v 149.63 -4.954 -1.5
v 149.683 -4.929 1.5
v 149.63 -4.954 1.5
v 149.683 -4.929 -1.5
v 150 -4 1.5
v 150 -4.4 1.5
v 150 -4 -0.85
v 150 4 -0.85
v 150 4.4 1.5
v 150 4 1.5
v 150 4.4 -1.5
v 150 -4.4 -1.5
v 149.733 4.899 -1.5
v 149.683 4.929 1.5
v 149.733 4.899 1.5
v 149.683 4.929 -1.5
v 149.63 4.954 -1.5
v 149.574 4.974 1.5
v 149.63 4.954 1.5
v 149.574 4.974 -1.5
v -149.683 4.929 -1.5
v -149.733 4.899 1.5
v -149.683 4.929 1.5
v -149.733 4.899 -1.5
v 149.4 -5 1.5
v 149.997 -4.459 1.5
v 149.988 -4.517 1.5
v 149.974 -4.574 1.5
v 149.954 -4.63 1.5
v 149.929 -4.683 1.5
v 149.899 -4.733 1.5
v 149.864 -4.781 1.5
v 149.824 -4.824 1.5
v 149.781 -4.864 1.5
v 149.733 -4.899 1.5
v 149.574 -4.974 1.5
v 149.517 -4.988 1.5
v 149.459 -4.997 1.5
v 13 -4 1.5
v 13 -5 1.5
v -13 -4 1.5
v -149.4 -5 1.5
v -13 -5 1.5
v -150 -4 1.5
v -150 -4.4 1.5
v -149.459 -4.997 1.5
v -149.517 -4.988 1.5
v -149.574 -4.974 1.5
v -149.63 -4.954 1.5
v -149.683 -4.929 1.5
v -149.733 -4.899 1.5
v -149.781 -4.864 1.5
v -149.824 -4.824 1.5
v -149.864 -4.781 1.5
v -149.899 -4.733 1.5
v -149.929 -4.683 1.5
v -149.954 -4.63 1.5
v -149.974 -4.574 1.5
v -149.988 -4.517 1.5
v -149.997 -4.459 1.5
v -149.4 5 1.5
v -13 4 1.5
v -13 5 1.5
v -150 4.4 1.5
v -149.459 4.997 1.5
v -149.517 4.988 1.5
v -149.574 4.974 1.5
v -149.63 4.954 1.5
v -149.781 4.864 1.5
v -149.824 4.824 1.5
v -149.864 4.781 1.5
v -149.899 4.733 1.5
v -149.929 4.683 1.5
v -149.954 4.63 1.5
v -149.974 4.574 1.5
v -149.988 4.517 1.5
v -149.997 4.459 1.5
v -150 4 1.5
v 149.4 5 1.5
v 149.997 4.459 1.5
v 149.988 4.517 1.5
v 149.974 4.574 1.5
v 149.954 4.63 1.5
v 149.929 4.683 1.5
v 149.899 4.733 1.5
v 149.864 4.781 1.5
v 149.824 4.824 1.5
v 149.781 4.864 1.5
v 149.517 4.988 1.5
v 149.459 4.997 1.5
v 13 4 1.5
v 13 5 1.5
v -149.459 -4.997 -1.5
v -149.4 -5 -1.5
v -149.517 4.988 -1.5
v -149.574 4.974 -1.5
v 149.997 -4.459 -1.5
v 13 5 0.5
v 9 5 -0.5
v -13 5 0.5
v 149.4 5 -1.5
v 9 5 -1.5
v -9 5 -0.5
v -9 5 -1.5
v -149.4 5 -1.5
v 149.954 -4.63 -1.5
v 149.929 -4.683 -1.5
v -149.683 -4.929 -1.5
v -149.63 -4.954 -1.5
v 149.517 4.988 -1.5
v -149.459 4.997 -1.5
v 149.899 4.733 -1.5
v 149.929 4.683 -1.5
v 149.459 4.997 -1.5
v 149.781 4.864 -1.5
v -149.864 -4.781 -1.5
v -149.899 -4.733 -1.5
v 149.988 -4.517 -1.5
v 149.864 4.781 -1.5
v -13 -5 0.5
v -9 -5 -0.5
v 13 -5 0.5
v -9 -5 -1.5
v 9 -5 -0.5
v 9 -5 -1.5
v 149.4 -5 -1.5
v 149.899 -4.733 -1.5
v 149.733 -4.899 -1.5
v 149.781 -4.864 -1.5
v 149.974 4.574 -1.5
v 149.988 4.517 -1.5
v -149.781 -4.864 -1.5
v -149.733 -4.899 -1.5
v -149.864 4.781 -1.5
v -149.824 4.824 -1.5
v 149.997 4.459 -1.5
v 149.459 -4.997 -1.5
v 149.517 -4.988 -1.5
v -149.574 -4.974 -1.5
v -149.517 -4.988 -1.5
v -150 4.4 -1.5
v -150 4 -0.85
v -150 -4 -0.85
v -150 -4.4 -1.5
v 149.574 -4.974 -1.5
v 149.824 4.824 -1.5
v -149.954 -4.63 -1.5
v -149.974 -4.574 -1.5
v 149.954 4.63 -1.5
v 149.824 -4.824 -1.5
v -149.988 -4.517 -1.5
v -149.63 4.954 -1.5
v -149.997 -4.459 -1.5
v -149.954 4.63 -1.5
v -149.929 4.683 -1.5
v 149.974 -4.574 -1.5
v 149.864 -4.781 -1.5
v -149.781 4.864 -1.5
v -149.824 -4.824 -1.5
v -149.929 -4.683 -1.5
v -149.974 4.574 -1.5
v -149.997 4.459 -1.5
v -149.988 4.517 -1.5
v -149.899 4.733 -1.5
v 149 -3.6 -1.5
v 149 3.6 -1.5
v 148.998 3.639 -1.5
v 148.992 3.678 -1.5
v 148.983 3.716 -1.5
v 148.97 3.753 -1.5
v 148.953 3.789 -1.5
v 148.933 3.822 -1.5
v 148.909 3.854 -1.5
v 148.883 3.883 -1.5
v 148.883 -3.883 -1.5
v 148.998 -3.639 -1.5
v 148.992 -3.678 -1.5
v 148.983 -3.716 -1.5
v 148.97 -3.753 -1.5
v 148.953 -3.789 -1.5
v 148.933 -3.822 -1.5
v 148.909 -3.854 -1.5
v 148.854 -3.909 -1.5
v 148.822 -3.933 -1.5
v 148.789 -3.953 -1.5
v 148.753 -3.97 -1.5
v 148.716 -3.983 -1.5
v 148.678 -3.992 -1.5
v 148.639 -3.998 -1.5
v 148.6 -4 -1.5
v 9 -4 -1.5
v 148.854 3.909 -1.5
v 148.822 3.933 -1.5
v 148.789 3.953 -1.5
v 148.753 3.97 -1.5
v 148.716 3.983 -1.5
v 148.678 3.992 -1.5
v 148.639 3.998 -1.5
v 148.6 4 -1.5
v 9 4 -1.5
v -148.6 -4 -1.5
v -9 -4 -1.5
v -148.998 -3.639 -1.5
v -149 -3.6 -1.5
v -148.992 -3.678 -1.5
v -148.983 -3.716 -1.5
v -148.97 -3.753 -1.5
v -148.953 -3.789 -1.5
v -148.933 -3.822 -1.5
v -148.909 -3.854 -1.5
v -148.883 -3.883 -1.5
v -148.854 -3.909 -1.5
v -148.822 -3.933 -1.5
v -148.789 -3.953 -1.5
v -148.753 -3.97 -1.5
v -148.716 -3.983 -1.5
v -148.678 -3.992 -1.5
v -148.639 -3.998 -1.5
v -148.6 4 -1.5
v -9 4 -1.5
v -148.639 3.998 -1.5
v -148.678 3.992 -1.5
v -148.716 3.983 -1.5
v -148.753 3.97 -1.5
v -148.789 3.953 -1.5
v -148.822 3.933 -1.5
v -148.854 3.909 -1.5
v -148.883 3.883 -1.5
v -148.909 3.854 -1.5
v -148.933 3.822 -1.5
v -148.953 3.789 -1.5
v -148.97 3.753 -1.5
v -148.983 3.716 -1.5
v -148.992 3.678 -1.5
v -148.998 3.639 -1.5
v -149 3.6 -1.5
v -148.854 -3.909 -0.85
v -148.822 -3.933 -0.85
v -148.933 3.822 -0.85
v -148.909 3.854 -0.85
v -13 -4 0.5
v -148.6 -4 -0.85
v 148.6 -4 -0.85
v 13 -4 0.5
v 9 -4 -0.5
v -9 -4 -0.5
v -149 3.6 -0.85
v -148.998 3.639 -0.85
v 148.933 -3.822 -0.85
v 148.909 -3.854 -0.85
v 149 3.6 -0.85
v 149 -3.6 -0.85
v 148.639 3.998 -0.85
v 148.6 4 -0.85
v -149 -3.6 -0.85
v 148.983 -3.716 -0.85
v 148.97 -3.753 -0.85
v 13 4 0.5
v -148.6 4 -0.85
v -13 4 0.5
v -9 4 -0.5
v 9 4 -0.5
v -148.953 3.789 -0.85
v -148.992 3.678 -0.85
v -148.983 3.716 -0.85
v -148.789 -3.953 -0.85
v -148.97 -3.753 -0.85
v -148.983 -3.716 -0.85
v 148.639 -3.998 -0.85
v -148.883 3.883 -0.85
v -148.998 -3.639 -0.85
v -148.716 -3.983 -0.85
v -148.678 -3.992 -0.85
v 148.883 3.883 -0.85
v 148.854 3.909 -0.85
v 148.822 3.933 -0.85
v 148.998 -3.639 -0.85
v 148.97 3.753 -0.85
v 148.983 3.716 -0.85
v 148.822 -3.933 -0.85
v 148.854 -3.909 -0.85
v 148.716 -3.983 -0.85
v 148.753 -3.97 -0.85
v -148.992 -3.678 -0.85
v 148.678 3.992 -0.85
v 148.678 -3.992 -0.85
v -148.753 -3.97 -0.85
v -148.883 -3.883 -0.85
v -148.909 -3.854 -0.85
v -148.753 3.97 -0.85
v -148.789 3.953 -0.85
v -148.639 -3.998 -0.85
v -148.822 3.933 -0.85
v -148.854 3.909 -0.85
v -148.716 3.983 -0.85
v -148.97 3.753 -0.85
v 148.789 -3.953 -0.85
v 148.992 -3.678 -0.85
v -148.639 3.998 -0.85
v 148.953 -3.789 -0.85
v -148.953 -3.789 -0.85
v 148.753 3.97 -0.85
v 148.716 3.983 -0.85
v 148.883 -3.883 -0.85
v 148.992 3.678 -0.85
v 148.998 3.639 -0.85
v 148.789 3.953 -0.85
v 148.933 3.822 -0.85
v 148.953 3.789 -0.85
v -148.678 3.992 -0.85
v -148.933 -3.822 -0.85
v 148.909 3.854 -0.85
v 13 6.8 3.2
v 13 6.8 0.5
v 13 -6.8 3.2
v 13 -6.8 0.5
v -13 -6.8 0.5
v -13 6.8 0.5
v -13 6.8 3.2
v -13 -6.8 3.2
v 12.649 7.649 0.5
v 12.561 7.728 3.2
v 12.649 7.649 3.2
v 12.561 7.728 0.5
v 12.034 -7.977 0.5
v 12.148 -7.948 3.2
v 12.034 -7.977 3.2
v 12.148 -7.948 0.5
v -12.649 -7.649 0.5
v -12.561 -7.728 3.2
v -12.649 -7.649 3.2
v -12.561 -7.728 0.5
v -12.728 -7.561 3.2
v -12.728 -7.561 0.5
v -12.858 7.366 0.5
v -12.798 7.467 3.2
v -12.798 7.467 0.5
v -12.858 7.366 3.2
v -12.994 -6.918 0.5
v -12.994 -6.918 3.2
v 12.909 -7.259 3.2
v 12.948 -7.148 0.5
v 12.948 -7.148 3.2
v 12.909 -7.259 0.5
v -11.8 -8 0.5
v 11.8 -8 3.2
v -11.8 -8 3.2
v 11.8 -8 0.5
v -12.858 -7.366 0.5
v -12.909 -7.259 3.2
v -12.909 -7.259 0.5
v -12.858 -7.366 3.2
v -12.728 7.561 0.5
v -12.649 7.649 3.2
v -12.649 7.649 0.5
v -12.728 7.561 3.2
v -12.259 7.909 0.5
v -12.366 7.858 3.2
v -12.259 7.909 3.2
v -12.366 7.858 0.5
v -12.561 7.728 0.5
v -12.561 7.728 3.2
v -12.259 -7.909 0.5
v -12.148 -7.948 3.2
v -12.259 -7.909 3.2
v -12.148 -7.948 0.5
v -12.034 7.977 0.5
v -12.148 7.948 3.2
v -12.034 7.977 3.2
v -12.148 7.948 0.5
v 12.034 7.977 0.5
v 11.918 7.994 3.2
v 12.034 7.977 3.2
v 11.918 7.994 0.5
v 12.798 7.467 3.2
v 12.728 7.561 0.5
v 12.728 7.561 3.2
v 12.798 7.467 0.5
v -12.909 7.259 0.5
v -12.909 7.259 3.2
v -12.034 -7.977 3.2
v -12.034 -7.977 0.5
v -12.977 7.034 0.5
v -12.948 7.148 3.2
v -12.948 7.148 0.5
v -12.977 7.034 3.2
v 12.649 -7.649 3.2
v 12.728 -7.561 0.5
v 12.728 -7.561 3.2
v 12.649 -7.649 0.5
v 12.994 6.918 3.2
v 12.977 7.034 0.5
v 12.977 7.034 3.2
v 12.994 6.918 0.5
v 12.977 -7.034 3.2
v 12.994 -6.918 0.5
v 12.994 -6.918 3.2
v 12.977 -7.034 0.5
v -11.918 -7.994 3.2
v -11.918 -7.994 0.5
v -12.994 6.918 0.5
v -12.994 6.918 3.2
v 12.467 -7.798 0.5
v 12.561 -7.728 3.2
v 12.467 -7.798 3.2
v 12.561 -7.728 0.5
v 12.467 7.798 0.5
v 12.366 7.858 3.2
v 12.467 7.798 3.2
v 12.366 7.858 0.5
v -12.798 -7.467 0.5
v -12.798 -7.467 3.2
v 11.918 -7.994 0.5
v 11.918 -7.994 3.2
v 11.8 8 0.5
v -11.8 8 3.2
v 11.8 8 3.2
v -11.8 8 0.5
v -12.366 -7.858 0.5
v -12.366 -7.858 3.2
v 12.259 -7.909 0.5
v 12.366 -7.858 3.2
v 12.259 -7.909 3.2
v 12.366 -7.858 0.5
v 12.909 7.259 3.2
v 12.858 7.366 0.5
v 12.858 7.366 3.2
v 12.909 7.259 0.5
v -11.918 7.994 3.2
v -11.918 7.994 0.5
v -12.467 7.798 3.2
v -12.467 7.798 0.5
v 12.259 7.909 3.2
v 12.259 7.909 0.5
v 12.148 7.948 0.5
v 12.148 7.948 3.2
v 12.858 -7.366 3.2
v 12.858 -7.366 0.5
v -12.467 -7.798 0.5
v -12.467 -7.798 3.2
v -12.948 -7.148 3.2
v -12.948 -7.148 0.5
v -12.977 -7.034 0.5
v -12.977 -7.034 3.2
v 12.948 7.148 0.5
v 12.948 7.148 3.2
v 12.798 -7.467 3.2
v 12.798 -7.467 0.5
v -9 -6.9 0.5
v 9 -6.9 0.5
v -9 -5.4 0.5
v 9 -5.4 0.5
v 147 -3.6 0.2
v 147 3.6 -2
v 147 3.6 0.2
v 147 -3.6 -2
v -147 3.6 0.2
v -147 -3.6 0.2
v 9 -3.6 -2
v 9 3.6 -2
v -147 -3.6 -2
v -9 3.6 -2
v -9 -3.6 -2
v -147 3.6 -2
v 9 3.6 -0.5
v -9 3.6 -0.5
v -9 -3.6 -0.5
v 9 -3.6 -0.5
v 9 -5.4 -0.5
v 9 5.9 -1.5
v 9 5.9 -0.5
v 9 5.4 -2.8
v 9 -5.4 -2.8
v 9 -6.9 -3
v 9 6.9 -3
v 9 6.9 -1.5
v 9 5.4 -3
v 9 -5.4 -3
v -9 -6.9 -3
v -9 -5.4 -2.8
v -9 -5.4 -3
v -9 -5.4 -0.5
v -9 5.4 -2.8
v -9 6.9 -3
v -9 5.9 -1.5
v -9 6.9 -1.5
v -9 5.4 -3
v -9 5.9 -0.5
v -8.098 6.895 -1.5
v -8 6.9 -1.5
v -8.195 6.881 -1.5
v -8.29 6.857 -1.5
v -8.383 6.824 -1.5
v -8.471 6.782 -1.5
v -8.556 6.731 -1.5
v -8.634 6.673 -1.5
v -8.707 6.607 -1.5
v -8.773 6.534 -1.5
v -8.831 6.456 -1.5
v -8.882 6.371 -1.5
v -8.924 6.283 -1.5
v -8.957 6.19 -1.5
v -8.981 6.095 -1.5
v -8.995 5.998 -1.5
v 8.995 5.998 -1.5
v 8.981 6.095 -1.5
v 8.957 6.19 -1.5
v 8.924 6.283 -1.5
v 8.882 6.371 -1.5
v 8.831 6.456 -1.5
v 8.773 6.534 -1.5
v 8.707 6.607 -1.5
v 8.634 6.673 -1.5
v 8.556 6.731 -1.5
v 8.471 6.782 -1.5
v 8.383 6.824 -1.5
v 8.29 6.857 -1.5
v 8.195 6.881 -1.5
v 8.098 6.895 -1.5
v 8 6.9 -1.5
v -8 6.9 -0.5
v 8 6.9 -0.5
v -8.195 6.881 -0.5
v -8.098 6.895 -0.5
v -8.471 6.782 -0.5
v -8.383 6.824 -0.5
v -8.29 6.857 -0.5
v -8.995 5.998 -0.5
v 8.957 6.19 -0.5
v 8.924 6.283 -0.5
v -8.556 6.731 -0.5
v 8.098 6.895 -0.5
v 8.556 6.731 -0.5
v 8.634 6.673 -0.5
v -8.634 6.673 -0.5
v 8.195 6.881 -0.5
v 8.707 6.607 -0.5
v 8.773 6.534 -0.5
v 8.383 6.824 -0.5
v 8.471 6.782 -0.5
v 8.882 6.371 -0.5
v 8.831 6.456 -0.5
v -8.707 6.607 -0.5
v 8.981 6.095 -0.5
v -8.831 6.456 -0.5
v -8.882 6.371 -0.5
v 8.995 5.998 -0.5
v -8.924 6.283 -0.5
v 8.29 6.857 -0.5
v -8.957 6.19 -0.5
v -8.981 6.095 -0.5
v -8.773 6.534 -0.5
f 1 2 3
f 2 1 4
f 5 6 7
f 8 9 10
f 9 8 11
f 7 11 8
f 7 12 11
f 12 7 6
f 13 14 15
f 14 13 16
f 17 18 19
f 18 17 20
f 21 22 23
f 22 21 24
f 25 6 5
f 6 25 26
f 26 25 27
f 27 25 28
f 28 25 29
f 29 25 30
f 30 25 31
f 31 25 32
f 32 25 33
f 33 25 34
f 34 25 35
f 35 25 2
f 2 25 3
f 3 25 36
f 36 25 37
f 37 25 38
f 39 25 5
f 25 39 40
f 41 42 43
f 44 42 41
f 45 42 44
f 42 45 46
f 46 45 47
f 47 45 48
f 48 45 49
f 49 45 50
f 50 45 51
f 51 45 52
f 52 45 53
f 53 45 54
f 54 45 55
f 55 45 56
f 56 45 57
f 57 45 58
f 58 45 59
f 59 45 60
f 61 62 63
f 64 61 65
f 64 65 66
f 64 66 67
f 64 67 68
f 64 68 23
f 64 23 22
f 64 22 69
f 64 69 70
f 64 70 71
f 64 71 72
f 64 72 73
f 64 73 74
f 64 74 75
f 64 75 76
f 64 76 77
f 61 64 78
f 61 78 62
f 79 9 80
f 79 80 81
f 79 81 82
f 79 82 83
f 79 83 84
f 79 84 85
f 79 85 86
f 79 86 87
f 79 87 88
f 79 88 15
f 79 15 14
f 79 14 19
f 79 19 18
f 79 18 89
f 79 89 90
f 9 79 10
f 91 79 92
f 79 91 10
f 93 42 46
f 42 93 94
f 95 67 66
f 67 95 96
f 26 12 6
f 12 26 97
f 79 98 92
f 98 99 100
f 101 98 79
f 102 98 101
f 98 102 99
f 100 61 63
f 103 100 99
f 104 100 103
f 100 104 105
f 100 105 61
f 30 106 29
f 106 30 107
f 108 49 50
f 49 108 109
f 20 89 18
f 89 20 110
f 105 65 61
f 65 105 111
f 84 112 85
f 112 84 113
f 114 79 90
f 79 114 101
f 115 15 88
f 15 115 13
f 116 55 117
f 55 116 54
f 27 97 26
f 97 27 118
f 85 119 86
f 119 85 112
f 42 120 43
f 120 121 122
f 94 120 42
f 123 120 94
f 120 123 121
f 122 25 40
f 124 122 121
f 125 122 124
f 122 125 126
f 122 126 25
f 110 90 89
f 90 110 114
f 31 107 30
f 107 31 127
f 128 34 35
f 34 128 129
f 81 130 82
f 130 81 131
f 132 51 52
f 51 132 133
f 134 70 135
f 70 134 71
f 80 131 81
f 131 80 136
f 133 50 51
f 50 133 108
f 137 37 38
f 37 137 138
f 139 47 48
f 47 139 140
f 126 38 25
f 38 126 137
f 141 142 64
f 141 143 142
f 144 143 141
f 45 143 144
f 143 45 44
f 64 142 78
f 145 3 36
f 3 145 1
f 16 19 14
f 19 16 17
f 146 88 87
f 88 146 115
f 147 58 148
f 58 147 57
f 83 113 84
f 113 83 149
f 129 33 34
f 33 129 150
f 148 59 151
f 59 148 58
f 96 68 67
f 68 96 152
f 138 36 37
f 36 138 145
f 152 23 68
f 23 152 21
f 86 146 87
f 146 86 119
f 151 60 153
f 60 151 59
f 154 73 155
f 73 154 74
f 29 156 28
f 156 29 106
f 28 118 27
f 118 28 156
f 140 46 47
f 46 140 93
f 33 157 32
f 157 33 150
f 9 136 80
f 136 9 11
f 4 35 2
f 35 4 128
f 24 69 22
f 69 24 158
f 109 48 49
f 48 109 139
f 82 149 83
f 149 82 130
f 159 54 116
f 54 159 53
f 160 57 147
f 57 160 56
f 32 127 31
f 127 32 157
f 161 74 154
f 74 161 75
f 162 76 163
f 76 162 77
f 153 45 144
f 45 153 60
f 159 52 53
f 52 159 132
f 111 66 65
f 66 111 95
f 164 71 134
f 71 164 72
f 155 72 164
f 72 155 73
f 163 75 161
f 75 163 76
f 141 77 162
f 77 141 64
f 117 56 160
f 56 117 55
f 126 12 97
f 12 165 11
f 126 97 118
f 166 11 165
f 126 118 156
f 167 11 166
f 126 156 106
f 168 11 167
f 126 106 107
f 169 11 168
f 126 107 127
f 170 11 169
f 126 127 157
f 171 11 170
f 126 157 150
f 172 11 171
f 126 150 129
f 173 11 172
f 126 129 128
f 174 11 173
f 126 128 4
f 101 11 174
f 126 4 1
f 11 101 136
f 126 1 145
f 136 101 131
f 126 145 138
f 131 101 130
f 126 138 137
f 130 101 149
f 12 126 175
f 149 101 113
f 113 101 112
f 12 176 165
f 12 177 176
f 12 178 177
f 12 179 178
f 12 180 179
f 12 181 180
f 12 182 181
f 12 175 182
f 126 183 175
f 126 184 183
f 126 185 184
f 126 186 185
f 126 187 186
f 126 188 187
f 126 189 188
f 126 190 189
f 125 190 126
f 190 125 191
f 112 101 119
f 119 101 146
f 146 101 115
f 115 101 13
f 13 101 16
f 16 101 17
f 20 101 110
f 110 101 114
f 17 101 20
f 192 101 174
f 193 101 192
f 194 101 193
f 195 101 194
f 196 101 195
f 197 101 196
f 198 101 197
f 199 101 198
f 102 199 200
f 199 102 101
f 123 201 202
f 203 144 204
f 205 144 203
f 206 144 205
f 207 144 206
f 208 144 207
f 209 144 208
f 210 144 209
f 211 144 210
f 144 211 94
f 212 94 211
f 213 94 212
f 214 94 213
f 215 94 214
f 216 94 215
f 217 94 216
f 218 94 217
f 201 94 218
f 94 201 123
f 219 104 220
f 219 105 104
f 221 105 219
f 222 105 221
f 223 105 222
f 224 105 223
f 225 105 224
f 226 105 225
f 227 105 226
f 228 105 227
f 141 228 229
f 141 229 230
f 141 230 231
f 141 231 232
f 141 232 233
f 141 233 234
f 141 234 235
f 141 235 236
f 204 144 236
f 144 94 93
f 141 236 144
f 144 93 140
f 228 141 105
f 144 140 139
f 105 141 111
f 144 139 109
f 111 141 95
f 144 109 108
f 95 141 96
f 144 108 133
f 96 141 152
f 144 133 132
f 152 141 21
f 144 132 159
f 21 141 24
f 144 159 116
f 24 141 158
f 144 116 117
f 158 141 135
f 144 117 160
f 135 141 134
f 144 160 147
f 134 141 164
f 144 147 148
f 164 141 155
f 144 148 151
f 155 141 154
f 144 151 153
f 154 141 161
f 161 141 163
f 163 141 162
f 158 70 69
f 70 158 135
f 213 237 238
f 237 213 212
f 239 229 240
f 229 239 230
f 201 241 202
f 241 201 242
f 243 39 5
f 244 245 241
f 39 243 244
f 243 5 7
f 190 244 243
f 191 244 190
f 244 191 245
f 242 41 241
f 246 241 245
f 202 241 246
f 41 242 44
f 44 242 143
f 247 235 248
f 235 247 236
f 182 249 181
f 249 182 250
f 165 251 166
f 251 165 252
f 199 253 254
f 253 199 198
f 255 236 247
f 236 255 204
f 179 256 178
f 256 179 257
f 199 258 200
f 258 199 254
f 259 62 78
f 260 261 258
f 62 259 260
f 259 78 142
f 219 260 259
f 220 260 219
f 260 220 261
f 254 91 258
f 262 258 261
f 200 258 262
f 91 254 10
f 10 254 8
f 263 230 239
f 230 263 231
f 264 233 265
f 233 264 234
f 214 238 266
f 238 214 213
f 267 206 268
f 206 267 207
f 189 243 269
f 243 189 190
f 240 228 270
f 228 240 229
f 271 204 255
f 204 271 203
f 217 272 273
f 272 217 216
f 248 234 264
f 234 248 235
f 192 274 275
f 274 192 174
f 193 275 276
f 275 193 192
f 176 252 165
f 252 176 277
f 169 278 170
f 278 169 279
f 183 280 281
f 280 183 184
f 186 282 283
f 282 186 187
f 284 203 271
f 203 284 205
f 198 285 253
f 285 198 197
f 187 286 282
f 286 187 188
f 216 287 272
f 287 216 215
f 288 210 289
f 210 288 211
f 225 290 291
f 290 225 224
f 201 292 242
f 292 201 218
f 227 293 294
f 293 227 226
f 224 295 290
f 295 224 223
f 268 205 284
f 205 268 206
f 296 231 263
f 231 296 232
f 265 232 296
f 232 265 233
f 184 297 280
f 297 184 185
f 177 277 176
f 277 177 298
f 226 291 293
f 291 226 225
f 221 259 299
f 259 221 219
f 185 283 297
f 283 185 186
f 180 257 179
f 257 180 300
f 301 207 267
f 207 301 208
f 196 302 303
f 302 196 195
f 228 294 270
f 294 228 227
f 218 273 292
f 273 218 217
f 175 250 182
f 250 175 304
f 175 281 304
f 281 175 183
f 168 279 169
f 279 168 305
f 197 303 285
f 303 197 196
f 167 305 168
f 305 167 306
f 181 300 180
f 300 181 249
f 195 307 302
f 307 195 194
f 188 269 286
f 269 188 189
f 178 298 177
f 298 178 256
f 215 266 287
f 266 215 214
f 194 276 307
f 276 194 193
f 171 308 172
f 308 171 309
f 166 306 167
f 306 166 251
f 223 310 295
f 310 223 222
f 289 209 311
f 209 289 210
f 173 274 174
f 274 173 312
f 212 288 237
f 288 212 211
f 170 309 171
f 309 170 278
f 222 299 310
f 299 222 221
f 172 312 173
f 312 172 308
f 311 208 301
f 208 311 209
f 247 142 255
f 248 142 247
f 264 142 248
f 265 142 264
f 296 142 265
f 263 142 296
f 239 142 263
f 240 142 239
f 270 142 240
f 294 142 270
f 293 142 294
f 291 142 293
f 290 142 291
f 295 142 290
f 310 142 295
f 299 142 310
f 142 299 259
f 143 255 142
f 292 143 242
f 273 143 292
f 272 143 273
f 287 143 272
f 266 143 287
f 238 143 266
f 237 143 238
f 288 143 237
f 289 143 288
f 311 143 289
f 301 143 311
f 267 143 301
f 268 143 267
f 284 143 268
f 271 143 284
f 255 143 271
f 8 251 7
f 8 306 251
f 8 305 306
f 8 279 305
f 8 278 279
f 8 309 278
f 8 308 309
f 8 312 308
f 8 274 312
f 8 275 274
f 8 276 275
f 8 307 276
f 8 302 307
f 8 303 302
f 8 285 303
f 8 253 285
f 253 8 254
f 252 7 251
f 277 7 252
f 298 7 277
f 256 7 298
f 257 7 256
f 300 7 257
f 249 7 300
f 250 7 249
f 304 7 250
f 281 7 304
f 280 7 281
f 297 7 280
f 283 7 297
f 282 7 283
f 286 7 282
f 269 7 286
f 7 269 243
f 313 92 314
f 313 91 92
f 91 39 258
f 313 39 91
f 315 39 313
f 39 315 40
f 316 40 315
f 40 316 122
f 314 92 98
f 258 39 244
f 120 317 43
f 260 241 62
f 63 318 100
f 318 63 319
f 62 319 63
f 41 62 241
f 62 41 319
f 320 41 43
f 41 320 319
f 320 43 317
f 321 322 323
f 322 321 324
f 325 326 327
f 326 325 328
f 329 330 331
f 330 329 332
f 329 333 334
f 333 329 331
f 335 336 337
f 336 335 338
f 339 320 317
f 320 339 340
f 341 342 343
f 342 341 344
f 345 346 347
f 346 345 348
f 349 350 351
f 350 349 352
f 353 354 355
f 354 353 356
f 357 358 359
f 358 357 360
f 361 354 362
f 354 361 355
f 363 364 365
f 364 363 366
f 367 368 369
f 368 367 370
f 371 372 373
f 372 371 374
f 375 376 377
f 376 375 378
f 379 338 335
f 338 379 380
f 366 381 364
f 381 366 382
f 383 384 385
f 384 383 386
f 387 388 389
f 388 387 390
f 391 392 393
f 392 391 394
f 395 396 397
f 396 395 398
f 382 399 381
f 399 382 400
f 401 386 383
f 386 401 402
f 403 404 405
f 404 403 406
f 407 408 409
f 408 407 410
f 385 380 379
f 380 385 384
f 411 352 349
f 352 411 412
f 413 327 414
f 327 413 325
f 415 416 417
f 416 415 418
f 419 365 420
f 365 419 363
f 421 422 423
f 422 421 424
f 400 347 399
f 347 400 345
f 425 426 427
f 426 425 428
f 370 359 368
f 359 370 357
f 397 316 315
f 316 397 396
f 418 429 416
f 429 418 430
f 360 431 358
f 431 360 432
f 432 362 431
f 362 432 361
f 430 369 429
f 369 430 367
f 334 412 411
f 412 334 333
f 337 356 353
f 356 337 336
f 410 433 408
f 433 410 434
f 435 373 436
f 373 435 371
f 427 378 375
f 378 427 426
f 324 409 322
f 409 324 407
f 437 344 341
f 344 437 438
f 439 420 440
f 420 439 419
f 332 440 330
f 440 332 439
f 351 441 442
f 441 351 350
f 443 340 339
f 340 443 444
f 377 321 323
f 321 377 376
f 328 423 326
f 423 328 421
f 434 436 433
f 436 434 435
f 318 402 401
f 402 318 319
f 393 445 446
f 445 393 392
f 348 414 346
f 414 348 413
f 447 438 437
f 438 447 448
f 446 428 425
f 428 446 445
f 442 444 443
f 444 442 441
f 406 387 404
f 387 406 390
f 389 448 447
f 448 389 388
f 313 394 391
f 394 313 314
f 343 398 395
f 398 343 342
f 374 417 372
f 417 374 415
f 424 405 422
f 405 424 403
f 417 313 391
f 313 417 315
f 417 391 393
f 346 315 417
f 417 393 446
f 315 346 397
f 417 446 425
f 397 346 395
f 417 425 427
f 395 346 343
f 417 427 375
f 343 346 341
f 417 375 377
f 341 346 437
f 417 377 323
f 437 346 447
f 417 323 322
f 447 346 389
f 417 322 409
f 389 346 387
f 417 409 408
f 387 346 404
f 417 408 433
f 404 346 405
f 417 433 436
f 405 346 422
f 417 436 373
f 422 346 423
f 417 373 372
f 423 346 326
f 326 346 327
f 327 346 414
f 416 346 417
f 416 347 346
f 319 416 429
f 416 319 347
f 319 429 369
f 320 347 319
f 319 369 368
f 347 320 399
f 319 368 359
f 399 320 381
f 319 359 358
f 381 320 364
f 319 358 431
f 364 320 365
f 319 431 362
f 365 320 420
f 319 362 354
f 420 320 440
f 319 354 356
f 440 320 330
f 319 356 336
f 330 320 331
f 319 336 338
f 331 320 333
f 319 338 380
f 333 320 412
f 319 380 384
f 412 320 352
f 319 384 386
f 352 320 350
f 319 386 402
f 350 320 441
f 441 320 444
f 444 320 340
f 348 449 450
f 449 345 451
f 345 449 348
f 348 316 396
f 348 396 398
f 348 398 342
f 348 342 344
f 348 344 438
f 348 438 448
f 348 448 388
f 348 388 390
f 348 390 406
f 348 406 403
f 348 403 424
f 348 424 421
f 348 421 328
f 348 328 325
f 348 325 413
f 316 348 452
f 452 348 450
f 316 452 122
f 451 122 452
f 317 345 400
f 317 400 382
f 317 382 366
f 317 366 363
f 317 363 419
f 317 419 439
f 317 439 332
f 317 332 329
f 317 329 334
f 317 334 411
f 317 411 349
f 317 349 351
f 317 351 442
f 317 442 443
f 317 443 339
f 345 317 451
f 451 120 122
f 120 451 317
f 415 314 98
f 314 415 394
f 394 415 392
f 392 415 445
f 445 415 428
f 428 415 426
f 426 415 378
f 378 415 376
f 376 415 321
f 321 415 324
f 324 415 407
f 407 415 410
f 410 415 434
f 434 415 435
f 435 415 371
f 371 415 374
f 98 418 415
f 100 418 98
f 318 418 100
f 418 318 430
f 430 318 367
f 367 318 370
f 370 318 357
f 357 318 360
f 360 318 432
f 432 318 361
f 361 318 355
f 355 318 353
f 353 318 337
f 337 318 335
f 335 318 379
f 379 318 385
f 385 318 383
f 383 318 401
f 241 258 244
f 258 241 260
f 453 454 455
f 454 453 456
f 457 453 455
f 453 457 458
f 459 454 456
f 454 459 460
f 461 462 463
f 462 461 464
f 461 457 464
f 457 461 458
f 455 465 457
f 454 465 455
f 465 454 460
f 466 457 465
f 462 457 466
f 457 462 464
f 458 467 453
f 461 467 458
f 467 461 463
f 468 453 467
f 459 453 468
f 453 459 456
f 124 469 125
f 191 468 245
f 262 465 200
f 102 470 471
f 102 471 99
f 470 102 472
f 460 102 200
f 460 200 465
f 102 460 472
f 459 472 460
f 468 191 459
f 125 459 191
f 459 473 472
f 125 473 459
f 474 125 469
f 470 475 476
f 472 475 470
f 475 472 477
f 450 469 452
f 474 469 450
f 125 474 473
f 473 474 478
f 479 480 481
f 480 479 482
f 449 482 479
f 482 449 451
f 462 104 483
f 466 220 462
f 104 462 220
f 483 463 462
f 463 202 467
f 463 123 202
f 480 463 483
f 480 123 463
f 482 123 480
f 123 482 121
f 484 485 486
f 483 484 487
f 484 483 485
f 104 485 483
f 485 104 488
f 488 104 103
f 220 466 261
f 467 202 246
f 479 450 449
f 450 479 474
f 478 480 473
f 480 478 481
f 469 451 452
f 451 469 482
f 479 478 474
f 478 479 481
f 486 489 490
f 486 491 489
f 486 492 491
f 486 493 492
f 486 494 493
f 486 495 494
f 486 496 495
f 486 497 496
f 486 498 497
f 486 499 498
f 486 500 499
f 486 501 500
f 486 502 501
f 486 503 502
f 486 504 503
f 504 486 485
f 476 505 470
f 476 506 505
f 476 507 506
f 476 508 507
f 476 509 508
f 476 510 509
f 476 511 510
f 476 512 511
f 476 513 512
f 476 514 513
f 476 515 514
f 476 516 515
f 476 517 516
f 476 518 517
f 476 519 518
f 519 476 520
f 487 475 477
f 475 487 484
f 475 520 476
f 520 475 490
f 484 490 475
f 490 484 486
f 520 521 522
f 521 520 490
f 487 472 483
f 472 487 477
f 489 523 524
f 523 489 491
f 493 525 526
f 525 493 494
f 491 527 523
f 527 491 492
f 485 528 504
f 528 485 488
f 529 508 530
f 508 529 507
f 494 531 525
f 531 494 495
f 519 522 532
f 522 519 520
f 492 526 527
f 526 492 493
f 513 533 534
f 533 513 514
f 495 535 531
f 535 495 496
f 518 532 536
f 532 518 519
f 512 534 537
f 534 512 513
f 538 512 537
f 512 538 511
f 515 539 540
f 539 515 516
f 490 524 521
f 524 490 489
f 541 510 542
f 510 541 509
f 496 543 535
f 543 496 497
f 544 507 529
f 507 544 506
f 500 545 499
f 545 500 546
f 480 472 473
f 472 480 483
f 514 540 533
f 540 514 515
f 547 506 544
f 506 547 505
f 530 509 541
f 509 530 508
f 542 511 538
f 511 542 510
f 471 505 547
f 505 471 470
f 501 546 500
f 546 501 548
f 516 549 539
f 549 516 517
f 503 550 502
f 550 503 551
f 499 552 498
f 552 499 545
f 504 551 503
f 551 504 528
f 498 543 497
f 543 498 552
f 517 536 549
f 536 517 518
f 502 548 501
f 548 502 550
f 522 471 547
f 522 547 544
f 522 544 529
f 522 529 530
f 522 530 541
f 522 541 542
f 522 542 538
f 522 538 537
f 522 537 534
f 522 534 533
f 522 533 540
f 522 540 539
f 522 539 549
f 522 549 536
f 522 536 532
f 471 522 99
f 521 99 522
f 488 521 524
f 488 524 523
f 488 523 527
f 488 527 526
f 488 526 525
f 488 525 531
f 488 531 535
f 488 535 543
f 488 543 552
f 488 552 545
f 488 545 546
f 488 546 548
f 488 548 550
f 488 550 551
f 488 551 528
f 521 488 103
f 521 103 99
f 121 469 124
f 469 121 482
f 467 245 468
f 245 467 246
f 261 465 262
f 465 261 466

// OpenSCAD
// Parameters
length = 300; //[150:600:1]
width = 10; //[5:20:1]
overall_depth = 3; //[2:6:0.1]
housing_thickness = 1; //[0.5:2:0.1]
pcb_thickness = 1.6; //[0.8:3.2:0.1]
aperture_width = 8; //[4:16:0.5]
led_count = 30; //[6:120:1]
segment_count = 10; //[2:40:1]
segment_length = 30; //[10:100:1]
mount_hole_diameter = 3; //[2:6:0.1]
mount_hole_spacing = 100; //[50:300:1]
overlap = 1; //[0.5:2:0.1]
body_corner_radius = 0.6; //[0.2:2:0.1]
led_pkg_x = 5; //[3:7:0.1]
led_pkg_y = 5; //[3:7:0.1]
led_height = 1.6; //[0.8:3:0.1]
led_lens_diameter = 3.5; //[2:6:0.1]
pad_size_x = 2.5; //[1.5:4:0.1]
pad_size_y = 2.5; //[1.5:4:0.1]
pad_thickness = 0.2; //[0.05:0.5:0.05]
cut_mark_thickness = 0.2; //[0.05:0.5:0.05]
cut_mark_width_x = 0.6; //[0.2:2:0.1]
clip_length = 18; //[10:40:1]
clip_wall = 1.5; //[1:3:0.1]
clip_depth = 8; //[4:20:1]
clip_clearance = 0.4; //[0.2:1:0.1]

$fn = 64;

// Rounded rectangular prism (3D) using hull of corner cylinders
module rounded_box(size=[10,10,3], r=0.6, center=true) {
  sx = size[0]; sy = size[1]; sz = size[2];
  rr = min(r, sx/2, sy/2);
  translate(center ? [0,0,0] : [sx/2, sy/2, sz/2])
    hull() {
      for (x = [-1, 1], y = [-1, 1])
        translate([x*(sx/2-rr), y*(sy/2-rr), 0])
          cylinder(r=rr, h=sz, center=true);
    }
}

// Light Strip - rigid body with defined thickness and mounting clip features
module light_strip_rigid() {
  // Guard against degenerate dimensions
  L = max(1, length);
  W = max(1, width);
  D = max(1, overall_depth);

  // Make a rigid "channel" style housing (not a through-slot that removes most material)
  // Outer shell
  outer = [L, W, D];

  // Inner cavity (opens from the top only), leaving a bottom and side walls
  // Keep at least 0.8mm bottom for rigidity
  bottom_t = max(0.8, housing_thickness);
  side_t   = max(0.8, housing_thickness);

  inner_L = max(0.1, L - 2*side_t);
  inner_W = max(0.1, W - 2*side_t);
  inner_D = max(0.1, D - bottom_t); // cavity height from bottom up to top

  // Top aperture is a shallow recess (diffuser seat), not a full cut-through
  ap_w = min(aperture_width, W - 2*side_t);
  ap_d = min(D*0.45, max(0.6, D - bottom_t - 0.2)); // shallow recess depth

  // Connector/control bump in the center (well-defined)
  bump_L = min(26, L*0.2);
  bump_W = min(W + 6, W*1.8);
  bump_H = max(2.5, D*0.9);

  union() {
    // Housing with internal cavity + top recess + mounting holes
    difference() {
      rounded_box(outer, r=body_corner_radius, center=true);

      // Internal cavity: open from top (so translate upward)
      // Center of cavity is at: bottom face + inner_D/2
      cavity_cz = -D/2 + bottom_t + inner_D/2;
      translate([0, 0, cavity_cz])
        rounded_box([inner_L, inner_W, inner_D + 2*overlap], r=max(0.2, body_corner_radius-0.2), center=true);

      // Top recess/aperture seat (shallow, not through)
      recess_cz = D/2 - ap_d/2;
      translate([0, 0, recess_cz])
        cube([L + 2*overlap, ap_w, ap_d + 2*overlap], center=true);

      // Mount holes (through Z, typical for clips/screws)
      // Keep them within length
      hole_span = min(mount_hole_spacing, L - 2*(mount_hole_diameter + 2));
      for (sx = [-1, 1]) {
        translate([sx*hole_span/2, 0, 0])
          cylinder(r=mount_hole_diameter/2, h=D + 2*overlap, center=true);
      }
    }

    // Central bump/control module on top, connected with overlap
    bump_cz = D/2 + bump_H/2 - overlap;
    translate([0, 0, bump_cz])
      rounded_box([bump_L, bump_W, bump_H], r=min(2, body_corner_radius+0.6), center=true);

    // Internal "PCB support rib" (solid) to avoid thin-line appearance and add rigidity
    // Sits inside cavity, connected to bottom
    rib_H = max(0.8, min(pcb_thickness, inner_D*0.6));
    rib_W = max(0.1, inner_W - 2*clip_clearance);
    rib_L = max(0.1, inner_L - 4);
    rib_cz = -D/2 + bottom_t + rib_H/2 - overlap;
    translate([0, 0, rib_cz])
      cube([rib_L, rib_W, rib_H + overlap], center=true);
  }
}

// Light Strip Clip - U-clip that wraps around the strip, connected as one solid
module light_strip_clip_rigid() {
  L = max(1, length);
  W = max(1, width);
  D = max(1, overall_depth);

  // Clip inner opening sized to strip width/depth with clearance
  inner_w = W + 2*clip_clearance;
  inner_d = D + clip_clearance;

  // Clip outer size
  outer_w = inner_w + 2*clip_wall;
  outer_d = inner_d + clip_wall;

  // Place clip centered at X=0, around the strip, with a small overlap into strip for guaranteed union
  // Clip center Z aligns so its inner opening straddles the strip
  clip_cz = 0; // centered on strip for wrap

  // Add a base foot under the strip for mounting (connected to clip)
  foot_L = clip_length;
  foot_W = outer_w;
  foot_H = max(2.0, clip_wall + 0.8);

  // Foot sits below strip bottom and overlaps clip
  foot_cz = -D/2 - foot_H/2 + overlap;

  union() {
    // U-clip body (difference to create opening)
    translate([0, 0, clip_cz])
      difference() {
        cube([clip_length, outer_w, outer_d], center=true);

        // Inner opening: shifted slightly upward so bottom has more material (rigid)
        // Inner opening center Z: raise by clip_wall/2
        inner_cz = clip_wall/2;
        translate([0, 0, inner_cz])
          cube([clip_length + 2*overlap, inner_w, inner_d + 2*overlap], center=true);

        // Front slot to allow snap-on (remove a thin slit on one side)
        slit_w = max(0.8, clip_wall*0.8);
        translate([0, outer_w/2 - slit_w/2, 0])
          cube([clip_length + 2*overlap, slit_w + 2*overlap, outer_d + 2*overlap], center=true);
      }

    // Mounting foot (solid), connected to clip and overlapping strip slightly
    translate([0, 0, foot_cz])
      rounded_box([foot_L, foot_W, foot_H], r=min(1.2, body_corner_radius+0.4), center=true);

    // Small gussets to strengthen clip-to-foot connection (both sides), guaranteed connected
    gus_L = clip_length;
    gus_W = max(1.2, clip_wall);
    gus_H = max(1.2, clip_wall);
    gus_x = 0;
    gus_z = (-D/2) - clip_wall/2; // around strip bottom region
    for (sy = [-1, 1]) {
      gus_y = sy*(outer_w/2 - gus_W/2);
      translate([gus_x, gus_y, gus_z])
        cube([gus_L, gus_W, gus_H], center=true);
    }
  }
}

// Assembly: ONE connected solid
union() {
  light_strip_rigid();

  // Place clip at center under the strip, overlapping for connectivity
  // Clip wraps around strip; ensure overlap by keeping it centered and dimensions include clearance
  light_strip_clip_rigid();
}
